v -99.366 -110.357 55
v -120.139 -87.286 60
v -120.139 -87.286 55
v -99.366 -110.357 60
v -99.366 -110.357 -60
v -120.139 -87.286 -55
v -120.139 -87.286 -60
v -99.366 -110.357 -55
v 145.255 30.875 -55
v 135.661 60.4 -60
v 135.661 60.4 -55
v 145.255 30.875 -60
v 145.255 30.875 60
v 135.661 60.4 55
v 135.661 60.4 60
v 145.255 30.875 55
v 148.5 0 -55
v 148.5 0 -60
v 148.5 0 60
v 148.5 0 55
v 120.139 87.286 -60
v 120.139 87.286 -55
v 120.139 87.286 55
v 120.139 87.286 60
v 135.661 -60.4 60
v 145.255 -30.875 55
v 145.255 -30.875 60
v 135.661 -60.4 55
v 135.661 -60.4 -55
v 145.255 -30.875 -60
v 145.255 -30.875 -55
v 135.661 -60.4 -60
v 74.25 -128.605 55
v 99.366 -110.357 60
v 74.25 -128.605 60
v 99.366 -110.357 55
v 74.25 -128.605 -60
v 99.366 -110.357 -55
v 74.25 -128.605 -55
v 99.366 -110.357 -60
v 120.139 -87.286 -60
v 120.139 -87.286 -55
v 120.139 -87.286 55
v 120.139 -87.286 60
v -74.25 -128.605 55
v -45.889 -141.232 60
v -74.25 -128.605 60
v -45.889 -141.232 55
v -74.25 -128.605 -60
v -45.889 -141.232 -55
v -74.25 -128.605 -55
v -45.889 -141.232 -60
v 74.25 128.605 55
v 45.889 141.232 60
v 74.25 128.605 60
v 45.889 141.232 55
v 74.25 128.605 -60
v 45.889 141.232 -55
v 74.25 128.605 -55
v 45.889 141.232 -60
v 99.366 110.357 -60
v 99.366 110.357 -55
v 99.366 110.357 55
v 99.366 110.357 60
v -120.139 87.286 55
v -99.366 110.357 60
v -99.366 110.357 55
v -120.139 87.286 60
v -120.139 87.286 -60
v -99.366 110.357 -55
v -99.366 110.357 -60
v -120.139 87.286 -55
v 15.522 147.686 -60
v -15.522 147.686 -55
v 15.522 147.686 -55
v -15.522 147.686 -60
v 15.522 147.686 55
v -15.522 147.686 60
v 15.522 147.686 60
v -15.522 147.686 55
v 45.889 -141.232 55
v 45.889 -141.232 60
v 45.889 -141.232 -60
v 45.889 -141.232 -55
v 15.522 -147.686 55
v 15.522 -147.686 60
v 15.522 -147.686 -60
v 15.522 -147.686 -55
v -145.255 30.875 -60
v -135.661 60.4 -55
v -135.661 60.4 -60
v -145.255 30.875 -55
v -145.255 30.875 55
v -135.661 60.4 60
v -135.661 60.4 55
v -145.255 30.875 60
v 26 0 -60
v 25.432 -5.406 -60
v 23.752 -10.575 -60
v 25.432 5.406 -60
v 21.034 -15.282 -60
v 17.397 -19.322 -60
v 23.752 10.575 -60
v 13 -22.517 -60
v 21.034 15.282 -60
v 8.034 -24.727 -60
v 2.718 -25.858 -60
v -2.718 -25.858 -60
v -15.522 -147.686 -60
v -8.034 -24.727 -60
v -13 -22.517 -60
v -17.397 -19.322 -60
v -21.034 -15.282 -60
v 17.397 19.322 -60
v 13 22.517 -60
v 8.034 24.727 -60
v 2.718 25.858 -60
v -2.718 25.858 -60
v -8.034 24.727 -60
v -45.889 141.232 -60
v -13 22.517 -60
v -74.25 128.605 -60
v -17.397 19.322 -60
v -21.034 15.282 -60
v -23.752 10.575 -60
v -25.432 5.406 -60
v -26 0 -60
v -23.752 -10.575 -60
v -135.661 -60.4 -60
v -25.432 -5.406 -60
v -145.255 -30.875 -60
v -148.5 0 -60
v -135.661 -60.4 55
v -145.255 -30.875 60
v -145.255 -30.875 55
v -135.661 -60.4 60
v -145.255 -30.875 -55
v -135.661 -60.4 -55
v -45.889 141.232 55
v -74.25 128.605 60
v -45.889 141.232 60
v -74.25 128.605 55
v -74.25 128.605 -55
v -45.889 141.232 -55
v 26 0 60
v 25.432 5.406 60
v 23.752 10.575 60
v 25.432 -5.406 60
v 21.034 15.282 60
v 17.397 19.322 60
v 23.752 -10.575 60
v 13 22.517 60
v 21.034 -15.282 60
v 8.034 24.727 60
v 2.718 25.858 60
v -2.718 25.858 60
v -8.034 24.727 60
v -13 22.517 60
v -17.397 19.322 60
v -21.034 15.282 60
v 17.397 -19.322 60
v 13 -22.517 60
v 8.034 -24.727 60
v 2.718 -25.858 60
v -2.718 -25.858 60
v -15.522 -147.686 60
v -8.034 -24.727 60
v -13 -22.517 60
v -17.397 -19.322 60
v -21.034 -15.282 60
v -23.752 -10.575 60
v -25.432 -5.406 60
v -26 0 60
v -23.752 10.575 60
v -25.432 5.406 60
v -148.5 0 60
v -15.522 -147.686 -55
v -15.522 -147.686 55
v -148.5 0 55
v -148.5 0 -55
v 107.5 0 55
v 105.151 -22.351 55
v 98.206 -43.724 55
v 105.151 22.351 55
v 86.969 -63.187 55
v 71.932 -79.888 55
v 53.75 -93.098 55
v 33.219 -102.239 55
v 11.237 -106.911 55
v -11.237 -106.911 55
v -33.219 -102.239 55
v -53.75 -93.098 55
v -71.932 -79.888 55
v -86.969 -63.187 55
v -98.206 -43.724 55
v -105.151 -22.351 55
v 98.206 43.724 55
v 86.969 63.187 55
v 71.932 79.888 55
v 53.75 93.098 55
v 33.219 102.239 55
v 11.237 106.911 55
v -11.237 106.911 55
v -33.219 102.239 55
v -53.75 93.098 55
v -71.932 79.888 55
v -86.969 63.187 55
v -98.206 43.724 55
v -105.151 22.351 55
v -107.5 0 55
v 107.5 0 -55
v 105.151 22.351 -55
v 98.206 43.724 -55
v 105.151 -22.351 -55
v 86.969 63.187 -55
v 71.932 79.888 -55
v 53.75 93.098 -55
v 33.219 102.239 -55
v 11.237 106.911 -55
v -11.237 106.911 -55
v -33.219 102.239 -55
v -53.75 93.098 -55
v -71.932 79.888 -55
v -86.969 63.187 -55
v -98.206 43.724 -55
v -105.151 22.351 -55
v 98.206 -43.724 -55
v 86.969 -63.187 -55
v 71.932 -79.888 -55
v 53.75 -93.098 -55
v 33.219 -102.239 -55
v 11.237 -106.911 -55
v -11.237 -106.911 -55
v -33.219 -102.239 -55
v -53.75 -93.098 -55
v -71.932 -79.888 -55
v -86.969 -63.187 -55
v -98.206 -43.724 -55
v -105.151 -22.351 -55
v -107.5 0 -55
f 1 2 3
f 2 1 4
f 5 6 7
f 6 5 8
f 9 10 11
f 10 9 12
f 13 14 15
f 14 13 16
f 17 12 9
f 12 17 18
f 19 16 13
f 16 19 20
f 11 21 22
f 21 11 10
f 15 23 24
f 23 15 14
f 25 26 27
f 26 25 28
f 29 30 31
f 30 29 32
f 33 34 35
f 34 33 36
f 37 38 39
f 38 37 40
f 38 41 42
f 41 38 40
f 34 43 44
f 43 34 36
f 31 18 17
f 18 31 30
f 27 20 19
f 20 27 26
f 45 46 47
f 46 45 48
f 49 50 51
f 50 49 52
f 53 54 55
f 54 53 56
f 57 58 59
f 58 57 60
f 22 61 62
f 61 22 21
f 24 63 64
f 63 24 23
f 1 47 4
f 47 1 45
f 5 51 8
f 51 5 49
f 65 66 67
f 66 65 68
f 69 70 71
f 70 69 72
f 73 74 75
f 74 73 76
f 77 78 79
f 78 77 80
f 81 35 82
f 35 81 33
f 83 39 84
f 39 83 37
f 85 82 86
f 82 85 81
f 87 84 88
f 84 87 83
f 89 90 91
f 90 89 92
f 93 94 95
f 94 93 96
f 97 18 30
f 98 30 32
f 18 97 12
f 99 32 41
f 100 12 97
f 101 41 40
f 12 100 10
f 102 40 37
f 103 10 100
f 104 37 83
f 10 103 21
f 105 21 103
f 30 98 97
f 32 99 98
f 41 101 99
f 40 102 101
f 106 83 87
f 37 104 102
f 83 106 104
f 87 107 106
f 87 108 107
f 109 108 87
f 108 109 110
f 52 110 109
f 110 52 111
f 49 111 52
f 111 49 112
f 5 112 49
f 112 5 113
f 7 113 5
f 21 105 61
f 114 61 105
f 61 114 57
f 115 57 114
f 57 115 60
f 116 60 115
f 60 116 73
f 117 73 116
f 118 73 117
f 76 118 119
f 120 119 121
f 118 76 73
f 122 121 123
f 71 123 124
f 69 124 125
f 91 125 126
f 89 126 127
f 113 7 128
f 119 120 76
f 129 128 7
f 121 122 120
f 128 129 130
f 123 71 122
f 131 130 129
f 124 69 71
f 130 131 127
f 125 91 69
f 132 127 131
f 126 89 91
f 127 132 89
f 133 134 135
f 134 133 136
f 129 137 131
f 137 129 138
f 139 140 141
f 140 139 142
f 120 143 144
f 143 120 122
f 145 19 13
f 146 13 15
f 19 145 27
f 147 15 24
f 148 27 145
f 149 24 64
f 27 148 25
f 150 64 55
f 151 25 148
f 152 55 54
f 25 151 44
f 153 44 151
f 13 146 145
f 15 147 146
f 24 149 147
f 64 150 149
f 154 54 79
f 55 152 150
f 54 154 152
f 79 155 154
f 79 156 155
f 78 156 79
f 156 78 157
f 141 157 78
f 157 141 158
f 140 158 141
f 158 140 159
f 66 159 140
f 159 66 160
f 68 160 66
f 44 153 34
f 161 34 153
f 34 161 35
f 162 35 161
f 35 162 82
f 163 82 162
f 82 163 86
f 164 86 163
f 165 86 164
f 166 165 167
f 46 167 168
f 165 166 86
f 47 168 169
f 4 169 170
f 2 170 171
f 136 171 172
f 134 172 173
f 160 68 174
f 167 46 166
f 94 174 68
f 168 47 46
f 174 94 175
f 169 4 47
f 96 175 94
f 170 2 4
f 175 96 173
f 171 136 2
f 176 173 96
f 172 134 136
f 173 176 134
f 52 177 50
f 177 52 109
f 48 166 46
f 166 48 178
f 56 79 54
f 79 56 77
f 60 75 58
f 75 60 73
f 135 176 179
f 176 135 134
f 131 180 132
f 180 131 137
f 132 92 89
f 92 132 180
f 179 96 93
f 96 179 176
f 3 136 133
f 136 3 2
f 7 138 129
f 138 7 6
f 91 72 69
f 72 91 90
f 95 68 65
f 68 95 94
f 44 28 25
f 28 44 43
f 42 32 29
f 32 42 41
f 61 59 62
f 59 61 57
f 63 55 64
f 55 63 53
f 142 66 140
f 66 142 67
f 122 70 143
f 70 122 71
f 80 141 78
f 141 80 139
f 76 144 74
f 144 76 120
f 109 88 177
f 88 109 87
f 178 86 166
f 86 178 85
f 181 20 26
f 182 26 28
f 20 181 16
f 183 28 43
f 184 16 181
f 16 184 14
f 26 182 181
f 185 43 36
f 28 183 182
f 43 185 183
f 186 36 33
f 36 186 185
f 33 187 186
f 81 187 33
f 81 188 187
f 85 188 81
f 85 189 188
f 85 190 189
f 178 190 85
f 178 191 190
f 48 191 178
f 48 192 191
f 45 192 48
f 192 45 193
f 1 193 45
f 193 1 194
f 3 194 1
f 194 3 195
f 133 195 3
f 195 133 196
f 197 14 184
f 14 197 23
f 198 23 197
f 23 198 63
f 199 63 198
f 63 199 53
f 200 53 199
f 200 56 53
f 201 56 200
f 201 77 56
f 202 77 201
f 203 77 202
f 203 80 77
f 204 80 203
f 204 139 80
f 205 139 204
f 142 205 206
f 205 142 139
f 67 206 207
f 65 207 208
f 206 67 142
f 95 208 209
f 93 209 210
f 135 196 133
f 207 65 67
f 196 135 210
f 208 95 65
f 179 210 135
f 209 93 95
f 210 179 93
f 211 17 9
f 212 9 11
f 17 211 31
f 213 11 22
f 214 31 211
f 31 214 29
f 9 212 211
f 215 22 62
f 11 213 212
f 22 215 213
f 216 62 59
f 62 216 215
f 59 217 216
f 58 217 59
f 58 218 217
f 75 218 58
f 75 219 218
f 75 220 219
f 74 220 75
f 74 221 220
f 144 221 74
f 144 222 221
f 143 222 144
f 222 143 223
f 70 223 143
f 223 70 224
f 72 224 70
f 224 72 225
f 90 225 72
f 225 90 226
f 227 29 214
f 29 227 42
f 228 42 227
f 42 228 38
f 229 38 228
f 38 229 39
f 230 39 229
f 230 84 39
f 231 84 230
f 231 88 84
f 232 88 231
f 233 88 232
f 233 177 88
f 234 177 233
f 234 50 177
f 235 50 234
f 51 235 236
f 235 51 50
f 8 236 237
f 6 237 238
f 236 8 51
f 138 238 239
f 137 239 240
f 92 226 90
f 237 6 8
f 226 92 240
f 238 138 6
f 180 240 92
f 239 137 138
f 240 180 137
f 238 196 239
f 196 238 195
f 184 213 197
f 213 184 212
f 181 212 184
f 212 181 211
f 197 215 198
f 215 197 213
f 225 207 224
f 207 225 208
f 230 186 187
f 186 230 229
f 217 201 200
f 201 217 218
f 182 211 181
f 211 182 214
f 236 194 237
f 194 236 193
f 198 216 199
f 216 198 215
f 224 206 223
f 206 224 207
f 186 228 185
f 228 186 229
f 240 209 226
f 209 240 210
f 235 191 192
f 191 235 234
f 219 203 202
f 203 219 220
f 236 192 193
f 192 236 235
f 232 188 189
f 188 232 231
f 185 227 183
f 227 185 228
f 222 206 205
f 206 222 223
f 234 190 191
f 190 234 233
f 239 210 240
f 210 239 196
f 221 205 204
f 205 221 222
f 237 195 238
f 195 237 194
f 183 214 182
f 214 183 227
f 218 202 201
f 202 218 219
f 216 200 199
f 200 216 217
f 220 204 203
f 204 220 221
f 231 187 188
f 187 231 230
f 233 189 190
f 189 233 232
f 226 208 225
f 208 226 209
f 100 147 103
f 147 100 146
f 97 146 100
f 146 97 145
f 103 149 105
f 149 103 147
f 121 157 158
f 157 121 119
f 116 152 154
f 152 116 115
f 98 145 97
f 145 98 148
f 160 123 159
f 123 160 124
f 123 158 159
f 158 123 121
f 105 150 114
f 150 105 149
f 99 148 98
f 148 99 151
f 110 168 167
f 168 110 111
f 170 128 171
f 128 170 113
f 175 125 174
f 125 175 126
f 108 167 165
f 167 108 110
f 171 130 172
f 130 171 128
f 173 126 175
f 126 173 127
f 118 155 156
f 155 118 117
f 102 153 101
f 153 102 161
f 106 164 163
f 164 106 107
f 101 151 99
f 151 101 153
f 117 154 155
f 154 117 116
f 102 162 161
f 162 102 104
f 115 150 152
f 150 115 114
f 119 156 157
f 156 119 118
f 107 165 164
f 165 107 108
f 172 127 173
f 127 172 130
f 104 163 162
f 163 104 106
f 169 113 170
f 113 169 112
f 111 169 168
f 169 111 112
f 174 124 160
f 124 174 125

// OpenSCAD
/*
	Spool, written in OpenScad by Skippy - http://philipmcgaw.com
	
	

	This work is licensed under the Creative Commons Attribution-NonCommercial-ShareAlike 4.0 International License. To view a copy of this license, visit http://creativecommons.org/licenses/by-nc-sa/4.0/.
*/

// Things to Use

// Variables

	innerDia	=	215;
	outerDia	=	297;
	mountDia	=	52;
	wallThick	=	5;
	totalThick	=	120;

module spool() 
{
	// Main Body
	difference()
	{
		union()
		{
			// outside Walls
			difference()
			{
				cylinder(d = outerDia, h = totalThick, center = true);
				cylinder(d = outerDia + 1, h = totalThick - 2 * wallThick, center = true);
			}
			// inner Tube
			cylinder(d = innerDia, h = totalThick - 1, center = true);
		}
		// mounting hole
		cylinder(d = mountDia, h = totalThick + 1, center = true);
	}
}

spool();
